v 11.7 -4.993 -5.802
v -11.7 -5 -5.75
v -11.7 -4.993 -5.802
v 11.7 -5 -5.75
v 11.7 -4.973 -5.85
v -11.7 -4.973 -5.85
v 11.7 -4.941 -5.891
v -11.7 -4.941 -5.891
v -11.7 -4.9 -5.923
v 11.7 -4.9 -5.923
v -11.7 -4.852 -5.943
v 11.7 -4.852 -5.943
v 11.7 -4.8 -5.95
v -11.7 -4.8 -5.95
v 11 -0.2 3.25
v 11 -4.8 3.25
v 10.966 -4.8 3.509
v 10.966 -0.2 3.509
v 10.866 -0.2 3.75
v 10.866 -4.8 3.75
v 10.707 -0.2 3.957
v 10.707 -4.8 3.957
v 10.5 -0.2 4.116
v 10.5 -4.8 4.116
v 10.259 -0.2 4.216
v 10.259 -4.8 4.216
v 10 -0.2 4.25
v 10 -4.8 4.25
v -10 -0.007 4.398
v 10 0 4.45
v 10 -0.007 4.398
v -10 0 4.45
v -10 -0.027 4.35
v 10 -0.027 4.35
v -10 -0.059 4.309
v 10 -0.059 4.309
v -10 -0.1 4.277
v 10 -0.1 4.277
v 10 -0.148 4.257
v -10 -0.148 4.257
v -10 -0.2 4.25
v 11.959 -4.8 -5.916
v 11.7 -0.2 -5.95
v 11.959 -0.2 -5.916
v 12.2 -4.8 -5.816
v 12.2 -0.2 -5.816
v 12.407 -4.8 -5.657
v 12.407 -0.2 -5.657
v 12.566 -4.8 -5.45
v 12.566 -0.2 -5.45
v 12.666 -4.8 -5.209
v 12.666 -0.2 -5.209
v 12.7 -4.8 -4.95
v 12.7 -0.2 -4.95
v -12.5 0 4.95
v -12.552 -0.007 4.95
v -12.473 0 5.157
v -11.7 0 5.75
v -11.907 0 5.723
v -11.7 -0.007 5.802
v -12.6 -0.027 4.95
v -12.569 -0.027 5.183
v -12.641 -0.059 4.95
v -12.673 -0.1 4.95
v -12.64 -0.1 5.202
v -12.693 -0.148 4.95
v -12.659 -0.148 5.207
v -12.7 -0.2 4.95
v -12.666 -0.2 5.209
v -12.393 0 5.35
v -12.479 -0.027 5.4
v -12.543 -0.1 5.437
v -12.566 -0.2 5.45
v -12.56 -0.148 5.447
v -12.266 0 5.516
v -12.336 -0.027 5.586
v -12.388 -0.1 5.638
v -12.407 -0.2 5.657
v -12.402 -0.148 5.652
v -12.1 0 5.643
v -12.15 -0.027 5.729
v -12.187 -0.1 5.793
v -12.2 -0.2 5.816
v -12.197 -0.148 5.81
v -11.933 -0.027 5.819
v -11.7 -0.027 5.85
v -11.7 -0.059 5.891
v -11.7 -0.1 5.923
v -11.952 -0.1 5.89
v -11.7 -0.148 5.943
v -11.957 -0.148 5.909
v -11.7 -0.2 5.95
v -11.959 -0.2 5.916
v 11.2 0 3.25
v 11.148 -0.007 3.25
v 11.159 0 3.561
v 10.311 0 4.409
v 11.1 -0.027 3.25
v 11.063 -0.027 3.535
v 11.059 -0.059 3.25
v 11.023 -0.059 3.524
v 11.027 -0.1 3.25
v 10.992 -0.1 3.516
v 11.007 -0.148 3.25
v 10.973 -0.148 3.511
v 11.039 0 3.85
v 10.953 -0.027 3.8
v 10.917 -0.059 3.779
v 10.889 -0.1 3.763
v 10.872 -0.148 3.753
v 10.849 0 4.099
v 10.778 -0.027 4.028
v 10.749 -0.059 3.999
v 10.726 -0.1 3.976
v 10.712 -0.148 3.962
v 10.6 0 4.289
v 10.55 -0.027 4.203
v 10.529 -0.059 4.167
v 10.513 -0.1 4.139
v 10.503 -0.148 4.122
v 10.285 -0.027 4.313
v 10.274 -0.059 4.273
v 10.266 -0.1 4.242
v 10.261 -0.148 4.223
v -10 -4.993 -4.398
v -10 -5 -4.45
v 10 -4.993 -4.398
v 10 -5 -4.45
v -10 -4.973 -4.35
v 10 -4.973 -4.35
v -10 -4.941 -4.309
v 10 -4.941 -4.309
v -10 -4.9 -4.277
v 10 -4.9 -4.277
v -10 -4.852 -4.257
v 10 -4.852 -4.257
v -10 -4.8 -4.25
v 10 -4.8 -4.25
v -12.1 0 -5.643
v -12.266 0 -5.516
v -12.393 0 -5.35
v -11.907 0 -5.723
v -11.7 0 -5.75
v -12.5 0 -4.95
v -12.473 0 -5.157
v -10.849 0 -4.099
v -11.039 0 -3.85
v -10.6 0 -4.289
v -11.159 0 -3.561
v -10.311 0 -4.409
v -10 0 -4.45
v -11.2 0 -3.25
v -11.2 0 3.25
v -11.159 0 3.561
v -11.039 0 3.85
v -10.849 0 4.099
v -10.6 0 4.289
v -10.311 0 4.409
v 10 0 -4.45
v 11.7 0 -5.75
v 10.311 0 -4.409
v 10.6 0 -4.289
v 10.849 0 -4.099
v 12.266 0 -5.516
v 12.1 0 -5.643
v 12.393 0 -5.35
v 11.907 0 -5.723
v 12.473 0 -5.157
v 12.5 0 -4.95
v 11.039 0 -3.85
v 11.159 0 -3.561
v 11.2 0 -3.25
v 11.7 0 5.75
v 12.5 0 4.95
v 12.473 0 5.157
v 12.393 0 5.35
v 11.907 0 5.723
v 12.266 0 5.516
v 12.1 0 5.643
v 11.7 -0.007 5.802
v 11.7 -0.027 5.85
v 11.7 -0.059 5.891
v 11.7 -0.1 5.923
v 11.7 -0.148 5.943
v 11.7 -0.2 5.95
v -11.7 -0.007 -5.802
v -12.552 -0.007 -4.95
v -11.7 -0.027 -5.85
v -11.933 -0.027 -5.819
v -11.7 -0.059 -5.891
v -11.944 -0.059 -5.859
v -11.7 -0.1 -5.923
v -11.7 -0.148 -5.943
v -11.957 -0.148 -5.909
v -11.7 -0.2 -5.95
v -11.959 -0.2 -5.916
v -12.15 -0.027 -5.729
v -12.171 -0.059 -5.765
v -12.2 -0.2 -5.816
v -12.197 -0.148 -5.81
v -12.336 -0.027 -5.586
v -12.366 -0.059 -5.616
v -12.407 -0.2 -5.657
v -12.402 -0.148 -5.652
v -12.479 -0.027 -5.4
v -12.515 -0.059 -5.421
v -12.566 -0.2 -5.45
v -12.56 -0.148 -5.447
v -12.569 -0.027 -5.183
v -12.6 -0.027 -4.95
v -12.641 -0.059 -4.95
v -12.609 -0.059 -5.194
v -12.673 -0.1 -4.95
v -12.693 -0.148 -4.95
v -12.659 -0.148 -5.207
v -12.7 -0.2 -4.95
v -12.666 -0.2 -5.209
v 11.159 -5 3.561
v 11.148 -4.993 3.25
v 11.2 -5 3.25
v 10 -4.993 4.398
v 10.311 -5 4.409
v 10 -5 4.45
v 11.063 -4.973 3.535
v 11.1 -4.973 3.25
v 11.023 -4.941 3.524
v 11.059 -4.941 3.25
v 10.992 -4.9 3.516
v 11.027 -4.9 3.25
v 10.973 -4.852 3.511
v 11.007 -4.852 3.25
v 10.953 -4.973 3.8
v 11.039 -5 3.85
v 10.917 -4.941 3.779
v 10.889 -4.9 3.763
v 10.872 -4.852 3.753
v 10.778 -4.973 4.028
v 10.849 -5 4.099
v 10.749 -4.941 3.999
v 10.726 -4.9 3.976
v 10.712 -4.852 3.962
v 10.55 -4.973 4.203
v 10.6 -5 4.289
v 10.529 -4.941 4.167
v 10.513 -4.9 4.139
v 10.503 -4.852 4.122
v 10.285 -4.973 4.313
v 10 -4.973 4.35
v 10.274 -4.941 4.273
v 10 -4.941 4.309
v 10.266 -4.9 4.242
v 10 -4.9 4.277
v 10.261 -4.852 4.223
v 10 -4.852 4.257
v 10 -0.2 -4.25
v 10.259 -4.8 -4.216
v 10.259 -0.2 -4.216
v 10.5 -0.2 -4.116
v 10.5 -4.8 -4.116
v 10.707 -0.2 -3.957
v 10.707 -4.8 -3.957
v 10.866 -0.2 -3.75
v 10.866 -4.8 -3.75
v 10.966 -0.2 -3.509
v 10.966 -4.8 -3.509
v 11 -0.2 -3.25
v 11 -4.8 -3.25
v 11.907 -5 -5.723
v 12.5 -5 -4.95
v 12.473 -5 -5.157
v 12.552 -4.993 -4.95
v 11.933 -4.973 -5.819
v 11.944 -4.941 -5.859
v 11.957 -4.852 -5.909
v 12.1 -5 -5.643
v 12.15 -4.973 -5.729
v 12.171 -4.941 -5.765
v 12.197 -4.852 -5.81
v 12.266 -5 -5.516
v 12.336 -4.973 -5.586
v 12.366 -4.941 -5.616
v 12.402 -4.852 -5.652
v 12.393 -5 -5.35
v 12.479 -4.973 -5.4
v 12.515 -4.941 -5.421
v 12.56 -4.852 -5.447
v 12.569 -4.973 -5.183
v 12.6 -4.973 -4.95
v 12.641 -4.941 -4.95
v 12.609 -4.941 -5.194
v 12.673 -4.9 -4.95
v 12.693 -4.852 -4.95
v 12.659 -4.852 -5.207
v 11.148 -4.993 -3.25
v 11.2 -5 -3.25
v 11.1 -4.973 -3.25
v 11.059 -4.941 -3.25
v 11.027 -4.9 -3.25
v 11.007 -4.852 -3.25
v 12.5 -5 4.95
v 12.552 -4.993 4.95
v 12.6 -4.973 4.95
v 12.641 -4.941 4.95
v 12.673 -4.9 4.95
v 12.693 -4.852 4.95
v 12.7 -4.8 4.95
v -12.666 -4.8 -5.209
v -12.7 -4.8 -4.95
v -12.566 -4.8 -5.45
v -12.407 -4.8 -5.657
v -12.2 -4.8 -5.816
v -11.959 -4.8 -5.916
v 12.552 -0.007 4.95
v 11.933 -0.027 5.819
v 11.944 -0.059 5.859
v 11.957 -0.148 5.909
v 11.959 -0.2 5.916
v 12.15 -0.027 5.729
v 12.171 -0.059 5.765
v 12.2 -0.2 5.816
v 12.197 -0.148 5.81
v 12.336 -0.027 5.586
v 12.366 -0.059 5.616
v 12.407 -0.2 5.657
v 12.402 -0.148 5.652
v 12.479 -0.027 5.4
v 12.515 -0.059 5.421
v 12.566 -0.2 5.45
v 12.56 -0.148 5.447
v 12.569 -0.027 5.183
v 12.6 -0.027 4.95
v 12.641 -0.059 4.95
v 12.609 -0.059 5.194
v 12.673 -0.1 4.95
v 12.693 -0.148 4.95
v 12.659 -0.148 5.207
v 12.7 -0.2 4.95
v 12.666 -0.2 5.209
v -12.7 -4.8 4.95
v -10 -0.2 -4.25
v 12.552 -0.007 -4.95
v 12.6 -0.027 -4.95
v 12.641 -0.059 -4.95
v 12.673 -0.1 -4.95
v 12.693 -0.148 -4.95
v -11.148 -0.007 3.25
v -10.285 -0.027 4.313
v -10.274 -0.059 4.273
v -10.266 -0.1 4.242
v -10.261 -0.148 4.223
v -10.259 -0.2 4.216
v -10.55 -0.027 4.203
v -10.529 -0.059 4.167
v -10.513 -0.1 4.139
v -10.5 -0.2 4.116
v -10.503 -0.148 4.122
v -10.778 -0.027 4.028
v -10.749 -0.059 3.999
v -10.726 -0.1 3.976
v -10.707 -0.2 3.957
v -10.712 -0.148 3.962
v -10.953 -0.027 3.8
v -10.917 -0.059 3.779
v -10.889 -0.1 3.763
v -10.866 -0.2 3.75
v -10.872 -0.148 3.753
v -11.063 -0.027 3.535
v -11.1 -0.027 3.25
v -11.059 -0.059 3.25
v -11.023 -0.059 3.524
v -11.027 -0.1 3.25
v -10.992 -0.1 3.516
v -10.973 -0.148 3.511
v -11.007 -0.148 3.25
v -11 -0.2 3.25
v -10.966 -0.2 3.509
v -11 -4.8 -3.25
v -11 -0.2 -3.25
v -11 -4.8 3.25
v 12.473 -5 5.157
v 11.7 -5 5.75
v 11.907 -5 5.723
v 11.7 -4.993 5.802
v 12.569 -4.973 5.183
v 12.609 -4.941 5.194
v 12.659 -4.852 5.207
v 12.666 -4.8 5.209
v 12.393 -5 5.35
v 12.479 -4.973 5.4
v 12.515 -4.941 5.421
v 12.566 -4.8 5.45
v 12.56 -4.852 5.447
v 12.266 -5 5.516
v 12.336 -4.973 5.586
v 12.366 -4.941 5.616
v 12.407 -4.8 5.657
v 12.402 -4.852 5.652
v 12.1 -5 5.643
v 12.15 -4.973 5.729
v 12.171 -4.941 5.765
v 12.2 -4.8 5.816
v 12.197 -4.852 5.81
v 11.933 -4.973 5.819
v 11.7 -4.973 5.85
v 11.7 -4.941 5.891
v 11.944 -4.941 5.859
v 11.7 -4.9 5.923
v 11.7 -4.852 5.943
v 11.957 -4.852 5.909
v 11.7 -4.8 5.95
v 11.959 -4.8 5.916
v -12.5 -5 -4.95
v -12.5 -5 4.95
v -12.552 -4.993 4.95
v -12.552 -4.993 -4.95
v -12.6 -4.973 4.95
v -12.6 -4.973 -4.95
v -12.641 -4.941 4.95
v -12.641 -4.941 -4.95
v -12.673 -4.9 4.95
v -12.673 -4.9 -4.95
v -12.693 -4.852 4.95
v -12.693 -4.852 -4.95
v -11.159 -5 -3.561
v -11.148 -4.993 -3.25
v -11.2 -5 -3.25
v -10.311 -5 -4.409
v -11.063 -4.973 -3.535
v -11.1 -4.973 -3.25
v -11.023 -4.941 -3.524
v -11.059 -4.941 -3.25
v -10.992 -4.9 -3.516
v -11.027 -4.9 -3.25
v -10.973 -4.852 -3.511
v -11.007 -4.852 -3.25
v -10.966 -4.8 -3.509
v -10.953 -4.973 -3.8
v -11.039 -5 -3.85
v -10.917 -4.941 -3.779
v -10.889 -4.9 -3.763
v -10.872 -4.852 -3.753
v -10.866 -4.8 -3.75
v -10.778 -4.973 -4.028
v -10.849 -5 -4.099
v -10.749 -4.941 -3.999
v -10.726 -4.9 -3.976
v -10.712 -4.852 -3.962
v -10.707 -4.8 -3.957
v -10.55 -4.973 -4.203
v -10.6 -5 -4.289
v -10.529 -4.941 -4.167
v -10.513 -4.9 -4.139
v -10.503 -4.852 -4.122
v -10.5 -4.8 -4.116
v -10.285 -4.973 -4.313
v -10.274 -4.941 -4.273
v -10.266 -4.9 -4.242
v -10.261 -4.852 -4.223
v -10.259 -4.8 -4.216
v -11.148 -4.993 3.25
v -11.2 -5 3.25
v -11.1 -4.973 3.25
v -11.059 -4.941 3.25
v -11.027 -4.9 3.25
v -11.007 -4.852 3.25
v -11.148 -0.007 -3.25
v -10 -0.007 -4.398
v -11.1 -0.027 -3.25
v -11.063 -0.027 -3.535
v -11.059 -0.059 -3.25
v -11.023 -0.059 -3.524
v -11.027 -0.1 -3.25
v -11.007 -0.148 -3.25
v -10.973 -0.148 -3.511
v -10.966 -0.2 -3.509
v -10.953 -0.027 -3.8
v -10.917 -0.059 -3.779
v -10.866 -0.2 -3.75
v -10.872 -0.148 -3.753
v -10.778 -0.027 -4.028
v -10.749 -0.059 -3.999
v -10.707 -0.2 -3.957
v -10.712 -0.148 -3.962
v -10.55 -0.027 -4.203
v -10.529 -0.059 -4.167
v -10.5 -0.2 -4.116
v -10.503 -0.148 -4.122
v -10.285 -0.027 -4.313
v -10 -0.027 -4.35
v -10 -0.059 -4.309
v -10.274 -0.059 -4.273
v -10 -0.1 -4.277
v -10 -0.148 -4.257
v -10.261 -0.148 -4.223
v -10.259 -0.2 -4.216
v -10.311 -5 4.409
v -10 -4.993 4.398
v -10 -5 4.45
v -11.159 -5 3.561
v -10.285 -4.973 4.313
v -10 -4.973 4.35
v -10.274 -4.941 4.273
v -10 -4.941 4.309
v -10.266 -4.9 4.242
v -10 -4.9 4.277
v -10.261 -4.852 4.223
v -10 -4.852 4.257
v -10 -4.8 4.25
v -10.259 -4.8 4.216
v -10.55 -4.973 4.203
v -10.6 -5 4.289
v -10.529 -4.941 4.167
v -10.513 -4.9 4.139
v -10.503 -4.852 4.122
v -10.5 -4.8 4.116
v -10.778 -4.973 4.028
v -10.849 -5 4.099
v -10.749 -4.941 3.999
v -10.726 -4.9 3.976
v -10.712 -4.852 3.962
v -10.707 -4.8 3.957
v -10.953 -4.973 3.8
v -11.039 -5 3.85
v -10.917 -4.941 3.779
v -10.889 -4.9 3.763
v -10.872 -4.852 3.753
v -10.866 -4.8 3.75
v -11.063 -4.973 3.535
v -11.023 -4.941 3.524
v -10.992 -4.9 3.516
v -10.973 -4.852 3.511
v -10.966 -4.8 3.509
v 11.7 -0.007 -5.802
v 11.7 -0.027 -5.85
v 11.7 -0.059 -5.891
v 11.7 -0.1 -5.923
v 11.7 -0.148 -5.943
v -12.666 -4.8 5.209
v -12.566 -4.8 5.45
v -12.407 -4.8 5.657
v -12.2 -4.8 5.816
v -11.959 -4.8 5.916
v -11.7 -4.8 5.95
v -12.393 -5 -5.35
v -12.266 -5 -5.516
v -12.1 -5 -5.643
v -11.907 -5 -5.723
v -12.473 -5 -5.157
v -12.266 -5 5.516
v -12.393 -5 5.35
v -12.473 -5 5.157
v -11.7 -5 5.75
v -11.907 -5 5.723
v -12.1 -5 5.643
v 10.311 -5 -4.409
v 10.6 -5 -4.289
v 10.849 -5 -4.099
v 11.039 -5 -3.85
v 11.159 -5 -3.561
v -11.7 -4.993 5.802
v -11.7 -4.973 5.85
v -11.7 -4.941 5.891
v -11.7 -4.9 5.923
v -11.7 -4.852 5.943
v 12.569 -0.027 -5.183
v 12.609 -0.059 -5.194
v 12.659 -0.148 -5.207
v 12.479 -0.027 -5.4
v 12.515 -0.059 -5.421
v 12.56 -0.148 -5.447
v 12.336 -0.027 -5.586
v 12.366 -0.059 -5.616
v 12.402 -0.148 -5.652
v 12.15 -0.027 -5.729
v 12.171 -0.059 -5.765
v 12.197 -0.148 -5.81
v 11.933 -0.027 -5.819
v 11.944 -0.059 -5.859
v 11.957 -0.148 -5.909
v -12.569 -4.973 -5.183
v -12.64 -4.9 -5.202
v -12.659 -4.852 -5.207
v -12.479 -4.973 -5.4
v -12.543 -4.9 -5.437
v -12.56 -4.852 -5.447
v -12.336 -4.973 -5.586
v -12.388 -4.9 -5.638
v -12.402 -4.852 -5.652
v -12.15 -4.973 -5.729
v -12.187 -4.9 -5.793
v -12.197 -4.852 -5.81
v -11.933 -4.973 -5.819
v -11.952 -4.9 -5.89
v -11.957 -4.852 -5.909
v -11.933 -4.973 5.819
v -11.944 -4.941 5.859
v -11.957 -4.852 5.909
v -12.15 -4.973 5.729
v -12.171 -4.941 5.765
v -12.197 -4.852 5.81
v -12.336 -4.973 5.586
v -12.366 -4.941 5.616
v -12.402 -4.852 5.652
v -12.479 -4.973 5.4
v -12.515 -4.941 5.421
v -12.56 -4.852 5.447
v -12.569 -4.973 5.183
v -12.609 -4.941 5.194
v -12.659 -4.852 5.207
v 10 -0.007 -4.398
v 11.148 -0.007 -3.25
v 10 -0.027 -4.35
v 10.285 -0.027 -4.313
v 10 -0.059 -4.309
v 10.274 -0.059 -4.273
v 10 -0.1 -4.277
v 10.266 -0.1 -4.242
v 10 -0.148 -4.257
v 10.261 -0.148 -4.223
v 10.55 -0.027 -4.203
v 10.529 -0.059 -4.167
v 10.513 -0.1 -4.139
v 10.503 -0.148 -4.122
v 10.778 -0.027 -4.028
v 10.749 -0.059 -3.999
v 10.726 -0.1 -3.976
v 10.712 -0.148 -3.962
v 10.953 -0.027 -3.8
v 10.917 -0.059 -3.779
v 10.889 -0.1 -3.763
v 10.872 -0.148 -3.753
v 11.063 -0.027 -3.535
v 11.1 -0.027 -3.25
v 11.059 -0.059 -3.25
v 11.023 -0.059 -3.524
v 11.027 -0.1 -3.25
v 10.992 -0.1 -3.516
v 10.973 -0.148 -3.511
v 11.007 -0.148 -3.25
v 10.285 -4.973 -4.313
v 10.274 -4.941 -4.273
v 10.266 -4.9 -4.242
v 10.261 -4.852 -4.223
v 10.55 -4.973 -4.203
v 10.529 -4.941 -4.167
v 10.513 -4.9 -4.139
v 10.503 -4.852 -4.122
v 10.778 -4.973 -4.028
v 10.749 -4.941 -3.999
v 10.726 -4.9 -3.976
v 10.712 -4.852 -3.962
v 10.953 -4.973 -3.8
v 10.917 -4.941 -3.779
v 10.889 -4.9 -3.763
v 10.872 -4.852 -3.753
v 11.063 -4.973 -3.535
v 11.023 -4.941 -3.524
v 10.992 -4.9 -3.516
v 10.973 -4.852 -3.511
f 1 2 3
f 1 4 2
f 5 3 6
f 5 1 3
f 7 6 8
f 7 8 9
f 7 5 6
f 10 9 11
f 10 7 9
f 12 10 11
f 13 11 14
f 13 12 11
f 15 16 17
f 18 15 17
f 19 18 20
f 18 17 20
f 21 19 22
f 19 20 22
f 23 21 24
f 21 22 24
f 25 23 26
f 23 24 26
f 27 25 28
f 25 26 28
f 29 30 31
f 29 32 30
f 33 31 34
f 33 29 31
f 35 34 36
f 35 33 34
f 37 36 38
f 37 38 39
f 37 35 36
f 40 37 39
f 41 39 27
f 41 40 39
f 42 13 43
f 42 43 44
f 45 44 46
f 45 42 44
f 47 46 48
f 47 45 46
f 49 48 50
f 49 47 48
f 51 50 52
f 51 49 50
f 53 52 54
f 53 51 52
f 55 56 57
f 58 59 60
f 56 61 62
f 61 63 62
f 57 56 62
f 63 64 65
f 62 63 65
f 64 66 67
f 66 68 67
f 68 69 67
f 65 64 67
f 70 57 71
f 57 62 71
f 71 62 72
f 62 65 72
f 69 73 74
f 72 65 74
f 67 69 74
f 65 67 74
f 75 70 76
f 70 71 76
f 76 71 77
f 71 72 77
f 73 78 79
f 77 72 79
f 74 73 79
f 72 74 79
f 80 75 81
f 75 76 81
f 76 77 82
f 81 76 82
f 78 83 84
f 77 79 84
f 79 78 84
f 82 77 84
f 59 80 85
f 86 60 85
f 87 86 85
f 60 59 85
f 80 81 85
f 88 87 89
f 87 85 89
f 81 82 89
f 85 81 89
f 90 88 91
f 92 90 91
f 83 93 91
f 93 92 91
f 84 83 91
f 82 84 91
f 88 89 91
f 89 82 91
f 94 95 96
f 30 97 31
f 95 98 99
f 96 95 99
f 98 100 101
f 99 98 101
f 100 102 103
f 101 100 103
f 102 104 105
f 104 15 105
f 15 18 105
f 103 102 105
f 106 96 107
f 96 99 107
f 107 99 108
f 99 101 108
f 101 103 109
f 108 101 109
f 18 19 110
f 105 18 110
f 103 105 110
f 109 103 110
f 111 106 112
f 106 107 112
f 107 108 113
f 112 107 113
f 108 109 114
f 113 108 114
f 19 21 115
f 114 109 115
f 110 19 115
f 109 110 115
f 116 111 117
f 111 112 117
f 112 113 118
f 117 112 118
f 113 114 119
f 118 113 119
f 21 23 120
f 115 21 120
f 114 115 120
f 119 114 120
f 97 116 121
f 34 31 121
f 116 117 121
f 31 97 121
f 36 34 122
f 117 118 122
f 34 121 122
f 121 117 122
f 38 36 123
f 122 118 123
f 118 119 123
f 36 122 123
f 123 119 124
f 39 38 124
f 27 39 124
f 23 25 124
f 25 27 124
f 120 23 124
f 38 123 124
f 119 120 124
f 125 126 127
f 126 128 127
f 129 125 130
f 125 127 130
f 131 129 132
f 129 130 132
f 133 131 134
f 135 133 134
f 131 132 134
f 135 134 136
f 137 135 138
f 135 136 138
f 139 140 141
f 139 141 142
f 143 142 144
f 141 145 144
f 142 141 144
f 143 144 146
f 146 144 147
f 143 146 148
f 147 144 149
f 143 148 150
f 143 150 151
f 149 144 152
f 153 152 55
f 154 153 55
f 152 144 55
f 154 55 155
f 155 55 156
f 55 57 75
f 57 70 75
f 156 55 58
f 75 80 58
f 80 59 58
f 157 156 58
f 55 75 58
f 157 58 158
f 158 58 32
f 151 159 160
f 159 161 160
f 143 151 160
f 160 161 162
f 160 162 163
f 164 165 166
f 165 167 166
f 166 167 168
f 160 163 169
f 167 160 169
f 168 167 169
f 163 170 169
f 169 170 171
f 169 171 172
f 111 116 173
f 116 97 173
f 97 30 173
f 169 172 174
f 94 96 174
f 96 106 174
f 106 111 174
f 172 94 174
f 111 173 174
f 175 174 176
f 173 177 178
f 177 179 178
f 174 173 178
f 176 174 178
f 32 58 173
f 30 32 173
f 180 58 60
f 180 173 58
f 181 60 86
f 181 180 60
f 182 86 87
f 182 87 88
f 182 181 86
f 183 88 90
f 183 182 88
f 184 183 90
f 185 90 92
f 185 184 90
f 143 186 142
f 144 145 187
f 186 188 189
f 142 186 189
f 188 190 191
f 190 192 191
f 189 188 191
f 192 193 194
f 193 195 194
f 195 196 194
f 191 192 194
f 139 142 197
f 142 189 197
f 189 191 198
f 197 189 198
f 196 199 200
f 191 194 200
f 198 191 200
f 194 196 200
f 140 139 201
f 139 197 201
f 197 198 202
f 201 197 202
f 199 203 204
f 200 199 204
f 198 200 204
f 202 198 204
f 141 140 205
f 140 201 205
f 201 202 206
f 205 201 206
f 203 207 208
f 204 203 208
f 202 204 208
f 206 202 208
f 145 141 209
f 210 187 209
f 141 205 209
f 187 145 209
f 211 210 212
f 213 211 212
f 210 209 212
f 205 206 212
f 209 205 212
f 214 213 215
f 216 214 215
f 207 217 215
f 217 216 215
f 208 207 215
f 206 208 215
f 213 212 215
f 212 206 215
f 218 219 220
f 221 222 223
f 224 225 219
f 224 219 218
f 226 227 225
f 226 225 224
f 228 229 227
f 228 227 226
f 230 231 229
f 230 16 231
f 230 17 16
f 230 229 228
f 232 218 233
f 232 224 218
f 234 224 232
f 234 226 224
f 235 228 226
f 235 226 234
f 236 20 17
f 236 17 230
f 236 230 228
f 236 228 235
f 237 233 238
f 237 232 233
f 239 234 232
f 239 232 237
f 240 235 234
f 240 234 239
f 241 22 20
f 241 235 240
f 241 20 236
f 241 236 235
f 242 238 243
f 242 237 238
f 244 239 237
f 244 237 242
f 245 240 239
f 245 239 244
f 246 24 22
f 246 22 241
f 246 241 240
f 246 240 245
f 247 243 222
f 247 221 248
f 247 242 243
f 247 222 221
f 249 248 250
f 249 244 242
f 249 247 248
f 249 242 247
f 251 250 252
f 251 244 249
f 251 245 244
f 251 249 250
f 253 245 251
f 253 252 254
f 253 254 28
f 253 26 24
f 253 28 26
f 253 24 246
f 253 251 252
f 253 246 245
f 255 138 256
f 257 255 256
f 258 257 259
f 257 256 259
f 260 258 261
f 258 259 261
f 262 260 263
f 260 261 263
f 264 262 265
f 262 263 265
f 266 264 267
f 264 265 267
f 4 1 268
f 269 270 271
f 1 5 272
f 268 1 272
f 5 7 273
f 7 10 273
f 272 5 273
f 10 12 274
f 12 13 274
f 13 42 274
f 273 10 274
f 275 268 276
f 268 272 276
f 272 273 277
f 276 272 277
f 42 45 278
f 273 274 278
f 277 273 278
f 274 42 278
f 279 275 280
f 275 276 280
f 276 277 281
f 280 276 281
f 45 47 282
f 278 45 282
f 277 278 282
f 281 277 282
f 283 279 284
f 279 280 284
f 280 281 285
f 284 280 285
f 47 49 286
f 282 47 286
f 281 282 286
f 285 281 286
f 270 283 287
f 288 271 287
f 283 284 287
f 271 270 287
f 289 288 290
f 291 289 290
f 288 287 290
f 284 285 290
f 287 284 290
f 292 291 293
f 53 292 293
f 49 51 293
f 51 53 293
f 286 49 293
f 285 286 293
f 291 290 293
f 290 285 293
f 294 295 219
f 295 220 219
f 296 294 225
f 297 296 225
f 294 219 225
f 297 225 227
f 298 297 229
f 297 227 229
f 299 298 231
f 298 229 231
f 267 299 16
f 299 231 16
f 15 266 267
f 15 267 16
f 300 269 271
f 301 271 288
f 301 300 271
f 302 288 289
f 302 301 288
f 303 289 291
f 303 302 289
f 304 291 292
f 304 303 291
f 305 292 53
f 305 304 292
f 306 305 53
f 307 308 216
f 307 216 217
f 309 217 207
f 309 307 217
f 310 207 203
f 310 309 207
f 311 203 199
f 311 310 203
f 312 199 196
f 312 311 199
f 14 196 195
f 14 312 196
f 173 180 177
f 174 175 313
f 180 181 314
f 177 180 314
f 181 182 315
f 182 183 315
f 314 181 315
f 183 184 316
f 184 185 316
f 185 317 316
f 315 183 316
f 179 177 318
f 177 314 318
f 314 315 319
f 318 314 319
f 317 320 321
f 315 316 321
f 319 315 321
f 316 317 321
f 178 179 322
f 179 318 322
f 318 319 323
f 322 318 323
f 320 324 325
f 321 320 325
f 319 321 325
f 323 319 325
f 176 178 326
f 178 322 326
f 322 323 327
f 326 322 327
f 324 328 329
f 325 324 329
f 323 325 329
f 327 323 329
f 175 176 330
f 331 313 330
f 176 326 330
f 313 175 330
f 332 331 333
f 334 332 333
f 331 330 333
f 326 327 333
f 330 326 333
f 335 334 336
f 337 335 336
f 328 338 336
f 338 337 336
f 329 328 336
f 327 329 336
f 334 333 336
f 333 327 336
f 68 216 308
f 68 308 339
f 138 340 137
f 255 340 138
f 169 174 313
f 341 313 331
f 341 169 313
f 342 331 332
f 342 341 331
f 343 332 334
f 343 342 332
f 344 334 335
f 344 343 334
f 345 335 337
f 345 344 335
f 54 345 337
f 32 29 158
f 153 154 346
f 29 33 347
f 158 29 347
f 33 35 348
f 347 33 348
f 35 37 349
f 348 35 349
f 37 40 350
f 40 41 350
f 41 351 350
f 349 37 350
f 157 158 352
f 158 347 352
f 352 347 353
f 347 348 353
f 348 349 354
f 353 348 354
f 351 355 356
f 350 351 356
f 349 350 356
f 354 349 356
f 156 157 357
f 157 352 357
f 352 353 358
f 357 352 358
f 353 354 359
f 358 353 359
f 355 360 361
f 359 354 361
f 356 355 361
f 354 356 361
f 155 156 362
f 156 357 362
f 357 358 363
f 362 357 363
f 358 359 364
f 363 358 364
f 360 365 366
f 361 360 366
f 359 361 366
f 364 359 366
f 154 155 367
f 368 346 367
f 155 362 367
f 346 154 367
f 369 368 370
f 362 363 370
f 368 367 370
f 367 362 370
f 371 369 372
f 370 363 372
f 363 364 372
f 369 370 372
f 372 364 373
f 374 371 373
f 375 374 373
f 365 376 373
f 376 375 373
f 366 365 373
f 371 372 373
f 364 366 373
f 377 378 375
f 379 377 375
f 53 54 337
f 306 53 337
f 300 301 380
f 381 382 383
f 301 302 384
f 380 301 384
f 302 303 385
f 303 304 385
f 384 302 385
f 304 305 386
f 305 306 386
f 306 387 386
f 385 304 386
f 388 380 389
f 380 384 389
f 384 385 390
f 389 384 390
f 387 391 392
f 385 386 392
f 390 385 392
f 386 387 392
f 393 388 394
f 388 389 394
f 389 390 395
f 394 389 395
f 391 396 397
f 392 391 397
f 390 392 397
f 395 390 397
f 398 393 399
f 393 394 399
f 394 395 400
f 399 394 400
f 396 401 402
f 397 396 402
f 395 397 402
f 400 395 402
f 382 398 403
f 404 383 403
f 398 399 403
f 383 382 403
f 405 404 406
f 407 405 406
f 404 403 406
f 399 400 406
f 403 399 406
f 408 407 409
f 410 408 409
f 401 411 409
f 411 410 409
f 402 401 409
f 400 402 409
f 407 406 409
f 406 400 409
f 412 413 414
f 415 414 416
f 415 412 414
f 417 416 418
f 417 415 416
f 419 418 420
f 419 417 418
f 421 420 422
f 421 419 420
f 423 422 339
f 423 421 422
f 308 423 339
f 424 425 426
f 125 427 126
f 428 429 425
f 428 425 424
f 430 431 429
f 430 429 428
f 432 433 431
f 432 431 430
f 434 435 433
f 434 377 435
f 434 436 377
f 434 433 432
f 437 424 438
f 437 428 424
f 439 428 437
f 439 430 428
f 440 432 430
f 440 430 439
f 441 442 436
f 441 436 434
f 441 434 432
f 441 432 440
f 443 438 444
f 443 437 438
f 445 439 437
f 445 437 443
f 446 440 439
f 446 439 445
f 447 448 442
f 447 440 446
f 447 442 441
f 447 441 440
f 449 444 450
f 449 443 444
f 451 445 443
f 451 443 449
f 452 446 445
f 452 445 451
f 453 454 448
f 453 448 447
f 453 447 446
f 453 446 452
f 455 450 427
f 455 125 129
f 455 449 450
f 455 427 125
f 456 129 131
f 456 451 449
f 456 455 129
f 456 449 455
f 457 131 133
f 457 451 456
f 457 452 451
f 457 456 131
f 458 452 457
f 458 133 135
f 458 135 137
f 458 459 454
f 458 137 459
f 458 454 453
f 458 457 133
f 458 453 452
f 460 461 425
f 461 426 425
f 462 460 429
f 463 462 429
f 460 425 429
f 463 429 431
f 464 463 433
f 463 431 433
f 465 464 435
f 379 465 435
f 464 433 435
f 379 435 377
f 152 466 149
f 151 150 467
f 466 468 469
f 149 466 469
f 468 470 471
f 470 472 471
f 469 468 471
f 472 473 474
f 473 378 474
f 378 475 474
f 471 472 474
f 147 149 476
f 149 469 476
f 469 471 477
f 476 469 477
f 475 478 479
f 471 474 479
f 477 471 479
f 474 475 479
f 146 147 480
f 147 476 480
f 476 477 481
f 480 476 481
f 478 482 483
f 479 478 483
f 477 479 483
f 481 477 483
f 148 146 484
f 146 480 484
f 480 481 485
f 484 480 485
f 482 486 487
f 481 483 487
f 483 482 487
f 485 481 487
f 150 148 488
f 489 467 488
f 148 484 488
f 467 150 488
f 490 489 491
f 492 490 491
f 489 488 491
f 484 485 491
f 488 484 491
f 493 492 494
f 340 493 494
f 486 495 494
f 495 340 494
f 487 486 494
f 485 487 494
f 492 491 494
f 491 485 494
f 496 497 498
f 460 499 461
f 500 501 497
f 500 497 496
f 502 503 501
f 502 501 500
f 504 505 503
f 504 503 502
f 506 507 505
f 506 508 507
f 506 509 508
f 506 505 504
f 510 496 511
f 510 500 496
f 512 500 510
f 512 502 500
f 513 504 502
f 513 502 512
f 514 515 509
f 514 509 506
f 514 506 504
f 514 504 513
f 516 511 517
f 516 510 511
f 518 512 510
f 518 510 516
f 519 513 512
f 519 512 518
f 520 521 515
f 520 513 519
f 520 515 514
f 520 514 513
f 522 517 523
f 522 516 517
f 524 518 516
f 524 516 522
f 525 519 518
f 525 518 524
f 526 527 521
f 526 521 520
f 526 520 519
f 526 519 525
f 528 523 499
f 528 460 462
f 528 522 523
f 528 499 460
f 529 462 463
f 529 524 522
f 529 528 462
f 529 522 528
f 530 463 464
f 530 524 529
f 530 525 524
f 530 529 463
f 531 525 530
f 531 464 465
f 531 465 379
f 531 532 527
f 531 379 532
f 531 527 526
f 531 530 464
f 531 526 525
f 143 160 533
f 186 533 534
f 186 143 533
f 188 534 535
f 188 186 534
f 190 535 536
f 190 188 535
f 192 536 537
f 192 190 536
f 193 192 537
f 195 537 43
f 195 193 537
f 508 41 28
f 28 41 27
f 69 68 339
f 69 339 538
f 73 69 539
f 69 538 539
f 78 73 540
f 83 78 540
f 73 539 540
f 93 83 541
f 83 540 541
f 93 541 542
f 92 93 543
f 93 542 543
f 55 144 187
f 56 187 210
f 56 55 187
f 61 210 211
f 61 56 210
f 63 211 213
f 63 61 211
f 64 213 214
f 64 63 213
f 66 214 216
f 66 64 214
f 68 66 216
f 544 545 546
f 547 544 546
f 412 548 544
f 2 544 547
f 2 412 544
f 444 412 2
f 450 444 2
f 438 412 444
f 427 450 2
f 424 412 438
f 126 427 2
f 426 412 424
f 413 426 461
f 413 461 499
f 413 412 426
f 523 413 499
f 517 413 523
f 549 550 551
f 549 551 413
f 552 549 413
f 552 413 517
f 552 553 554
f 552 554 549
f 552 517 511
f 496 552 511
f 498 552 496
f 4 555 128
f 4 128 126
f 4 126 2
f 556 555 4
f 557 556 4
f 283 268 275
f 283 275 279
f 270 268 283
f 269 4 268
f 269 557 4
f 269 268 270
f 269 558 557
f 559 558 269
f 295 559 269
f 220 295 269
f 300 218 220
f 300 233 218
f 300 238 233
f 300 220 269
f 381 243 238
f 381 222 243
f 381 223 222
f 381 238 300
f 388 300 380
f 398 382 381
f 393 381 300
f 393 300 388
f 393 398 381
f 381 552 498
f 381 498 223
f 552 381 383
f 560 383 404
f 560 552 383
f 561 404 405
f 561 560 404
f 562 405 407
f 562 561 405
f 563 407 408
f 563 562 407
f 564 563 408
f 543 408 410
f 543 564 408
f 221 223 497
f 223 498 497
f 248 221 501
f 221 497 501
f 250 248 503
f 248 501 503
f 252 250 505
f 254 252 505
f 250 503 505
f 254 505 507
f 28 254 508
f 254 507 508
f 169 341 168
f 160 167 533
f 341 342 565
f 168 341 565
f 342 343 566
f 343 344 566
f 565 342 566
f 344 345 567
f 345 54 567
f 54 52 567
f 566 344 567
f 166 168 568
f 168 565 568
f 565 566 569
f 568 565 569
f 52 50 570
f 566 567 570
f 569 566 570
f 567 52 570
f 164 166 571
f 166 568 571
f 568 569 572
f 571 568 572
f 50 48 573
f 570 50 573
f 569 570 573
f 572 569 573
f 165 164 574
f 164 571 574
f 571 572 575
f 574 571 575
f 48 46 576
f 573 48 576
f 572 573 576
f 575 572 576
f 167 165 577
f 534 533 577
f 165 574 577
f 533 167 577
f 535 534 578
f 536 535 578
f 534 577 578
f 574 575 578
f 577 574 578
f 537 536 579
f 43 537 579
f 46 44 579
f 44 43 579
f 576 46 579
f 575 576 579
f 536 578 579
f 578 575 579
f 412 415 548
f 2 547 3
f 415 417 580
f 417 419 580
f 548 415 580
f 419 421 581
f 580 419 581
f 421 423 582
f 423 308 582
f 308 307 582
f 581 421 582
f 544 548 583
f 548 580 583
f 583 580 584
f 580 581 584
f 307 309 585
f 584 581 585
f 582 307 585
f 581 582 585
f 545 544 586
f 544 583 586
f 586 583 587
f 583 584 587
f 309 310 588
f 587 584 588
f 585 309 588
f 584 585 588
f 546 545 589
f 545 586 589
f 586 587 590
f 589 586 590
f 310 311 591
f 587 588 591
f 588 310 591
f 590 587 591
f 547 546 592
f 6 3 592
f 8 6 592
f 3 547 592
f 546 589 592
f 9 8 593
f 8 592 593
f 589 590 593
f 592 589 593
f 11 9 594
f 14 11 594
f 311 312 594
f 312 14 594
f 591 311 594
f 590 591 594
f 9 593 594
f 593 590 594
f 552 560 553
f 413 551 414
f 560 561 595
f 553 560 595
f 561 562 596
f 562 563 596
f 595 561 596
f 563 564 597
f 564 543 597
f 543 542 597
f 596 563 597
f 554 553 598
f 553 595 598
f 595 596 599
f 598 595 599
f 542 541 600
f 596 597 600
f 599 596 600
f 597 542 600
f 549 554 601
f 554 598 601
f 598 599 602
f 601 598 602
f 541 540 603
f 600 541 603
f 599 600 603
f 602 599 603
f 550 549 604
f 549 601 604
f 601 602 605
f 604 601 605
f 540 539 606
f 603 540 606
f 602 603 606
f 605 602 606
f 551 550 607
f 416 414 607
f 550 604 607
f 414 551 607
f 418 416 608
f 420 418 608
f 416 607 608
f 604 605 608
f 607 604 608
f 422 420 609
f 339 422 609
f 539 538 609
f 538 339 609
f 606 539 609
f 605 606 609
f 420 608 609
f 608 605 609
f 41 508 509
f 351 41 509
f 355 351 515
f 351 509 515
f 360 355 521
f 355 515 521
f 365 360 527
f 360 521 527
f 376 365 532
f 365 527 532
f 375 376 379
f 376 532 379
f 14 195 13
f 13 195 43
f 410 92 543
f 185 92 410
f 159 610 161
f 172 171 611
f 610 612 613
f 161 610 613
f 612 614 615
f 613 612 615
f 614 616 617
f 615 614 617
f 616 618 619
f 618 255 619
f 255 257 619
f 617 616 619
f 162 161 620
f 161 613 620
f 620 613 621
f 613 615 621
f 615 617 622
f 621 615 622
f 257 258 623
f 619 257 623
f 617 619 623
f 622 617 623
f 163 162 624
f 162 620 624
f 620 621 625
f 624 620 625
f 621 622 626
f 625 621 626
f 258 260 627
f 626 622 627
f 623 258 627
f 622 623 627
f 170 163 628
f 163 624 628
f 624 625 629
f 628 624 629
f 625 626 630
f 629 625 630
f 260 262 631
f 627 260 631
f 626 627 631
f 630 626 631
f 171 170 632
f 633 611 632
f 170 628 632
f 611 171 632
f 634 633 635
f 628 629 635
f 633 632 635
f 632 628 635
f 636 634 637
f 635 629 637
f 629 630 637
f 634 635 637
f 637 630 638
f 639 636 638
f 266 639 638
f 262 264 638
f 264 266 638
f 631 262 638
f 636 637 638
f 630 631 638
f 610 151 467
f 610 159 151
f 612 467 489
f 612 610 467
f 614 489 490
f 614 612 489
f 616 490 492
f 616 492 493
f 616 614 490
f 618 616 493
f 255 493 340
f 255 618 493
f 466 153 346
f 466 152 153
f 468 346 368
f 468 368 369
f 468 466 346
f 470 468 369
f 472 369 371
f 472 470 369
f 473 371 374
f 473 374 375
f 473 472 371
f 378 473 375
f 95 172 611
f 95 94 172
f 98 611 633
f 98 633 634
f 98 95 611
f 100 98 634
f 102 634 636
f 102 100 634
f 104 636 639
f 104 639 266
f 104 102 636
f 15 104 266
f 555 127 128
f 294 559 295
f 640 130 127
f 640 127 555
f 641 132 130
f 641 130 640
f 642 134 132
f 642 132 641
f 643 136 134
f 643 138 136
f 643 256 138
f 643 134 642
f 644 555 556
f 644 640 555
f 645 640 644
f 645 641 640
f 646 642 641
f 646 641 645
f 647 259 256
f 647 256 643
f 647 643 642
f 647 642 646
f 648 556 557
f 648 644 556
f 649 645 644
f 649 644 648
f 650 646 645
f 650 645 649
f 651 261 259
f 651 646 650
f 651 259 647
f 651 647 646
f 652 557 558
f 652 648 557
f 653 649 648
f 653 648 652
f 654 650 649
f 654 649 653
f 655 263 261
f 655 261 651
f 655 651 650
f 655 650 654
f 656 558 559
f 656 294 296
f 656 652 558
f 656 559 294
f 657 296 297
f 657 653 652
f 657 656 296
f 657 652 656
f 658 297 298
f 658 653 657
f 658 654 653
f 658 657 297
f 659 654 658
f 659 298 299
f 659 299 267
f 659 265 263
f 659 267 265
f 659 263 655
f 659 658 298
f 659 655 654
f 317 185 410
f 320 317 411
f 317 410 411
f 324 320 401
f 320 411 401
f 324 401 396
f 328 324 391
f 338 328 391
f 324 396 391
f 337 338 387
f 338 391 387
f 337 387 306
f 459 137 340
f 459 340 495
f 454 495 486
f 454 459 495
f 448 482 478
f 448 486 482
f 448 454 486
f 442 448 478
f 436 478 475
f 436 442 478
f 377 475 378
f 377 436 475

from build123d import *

# Parameters (mm, degrees)
F0_W     = 25.4
F0_H     = 11.9
F0_W_2   = 22
F0_H_2   = 8.5
F1_DEPTH = 5
F2_R     = 1
F3_R     = 0.2
F4_R     = 0.2


with BuildPart() as f1:
    # F0 (on Front) → F1 (new body)
    with BuildSketch(Plane.XZ):
        Rectangle(F0_W, F0_H)
        Rectangle(F0_W_2, F0_H_2, mode=Mode.SUBTRACT)
    extrude(amount=F1_DEPTH)

    # F2
    f2_edges = [f1.edges().sort_by_distance(p)[0] for p in [
        (-12.7, -2.5, 5.95),
        (12.7, -2.5, 5.95),
        (12.7, -2.5, -5.95),
        (-12.7, -2.5, -5.95),
        (-11, -2.5, 4.25),
        (-11, -2.5, -4.25),
        (11, -2.5, 4.25),
        (11, -2.5, -4.25),
    ]]
    fillet(f2_edges, radius=F2_R)

    # F3
    f3_edges = [f1.edges().sort_by_distance(p)[0] for p in [
        (0, 0, 5.95),
        (-12.407107, 0, 5.657107),
        (-12.7, 0, 0),
        (-12.407107, 0, -5.657107),
        (0, 0, -5.95),
        (12.407107, 0, -5.657107),
        (12.7, 0, 0),
        (12.407107, 0, 5.657107),
        (0, -5, -5.95),
        (12.7, -5, 0),
        (12.407107, -5, 5.657107),
        (0, -5, 5.95),
        (-12.407107, -5, 5.657107),
        (-12.7, -5, 0),
        (12.407107, -5, -5.657107),
        (-12.407107, -5, -5.657107),
    ]]
    fillet(f3_edges, radius=F3_R)

    # F4
    f4_edges = [f1.edges().sort_by_distance(p)[0] for p in [
        (0, 0, -4.25),
        (10.707107, 0, -3.957107),
        (11, 0, 0),
        (10.707107, 0, 3.957107),
        (0, 0, 4.25),
        (-11, 0, 0),
        (-10.707107, 0, -3.957107),
        (-10.707107, 0, 3.957107),
        (10.707107, -5, 3.957107),
        (10.707107, -5, -3.957107),
        (-10.707107, -5, -3.957107),
        (-11, -5, 0),
        (0, -5, 4.25),
        (11, -5, 0),
        (0, -5, -4.25),
    ]]
    fillet(f4_edges, radius=F4_R)


solid = f1.part
